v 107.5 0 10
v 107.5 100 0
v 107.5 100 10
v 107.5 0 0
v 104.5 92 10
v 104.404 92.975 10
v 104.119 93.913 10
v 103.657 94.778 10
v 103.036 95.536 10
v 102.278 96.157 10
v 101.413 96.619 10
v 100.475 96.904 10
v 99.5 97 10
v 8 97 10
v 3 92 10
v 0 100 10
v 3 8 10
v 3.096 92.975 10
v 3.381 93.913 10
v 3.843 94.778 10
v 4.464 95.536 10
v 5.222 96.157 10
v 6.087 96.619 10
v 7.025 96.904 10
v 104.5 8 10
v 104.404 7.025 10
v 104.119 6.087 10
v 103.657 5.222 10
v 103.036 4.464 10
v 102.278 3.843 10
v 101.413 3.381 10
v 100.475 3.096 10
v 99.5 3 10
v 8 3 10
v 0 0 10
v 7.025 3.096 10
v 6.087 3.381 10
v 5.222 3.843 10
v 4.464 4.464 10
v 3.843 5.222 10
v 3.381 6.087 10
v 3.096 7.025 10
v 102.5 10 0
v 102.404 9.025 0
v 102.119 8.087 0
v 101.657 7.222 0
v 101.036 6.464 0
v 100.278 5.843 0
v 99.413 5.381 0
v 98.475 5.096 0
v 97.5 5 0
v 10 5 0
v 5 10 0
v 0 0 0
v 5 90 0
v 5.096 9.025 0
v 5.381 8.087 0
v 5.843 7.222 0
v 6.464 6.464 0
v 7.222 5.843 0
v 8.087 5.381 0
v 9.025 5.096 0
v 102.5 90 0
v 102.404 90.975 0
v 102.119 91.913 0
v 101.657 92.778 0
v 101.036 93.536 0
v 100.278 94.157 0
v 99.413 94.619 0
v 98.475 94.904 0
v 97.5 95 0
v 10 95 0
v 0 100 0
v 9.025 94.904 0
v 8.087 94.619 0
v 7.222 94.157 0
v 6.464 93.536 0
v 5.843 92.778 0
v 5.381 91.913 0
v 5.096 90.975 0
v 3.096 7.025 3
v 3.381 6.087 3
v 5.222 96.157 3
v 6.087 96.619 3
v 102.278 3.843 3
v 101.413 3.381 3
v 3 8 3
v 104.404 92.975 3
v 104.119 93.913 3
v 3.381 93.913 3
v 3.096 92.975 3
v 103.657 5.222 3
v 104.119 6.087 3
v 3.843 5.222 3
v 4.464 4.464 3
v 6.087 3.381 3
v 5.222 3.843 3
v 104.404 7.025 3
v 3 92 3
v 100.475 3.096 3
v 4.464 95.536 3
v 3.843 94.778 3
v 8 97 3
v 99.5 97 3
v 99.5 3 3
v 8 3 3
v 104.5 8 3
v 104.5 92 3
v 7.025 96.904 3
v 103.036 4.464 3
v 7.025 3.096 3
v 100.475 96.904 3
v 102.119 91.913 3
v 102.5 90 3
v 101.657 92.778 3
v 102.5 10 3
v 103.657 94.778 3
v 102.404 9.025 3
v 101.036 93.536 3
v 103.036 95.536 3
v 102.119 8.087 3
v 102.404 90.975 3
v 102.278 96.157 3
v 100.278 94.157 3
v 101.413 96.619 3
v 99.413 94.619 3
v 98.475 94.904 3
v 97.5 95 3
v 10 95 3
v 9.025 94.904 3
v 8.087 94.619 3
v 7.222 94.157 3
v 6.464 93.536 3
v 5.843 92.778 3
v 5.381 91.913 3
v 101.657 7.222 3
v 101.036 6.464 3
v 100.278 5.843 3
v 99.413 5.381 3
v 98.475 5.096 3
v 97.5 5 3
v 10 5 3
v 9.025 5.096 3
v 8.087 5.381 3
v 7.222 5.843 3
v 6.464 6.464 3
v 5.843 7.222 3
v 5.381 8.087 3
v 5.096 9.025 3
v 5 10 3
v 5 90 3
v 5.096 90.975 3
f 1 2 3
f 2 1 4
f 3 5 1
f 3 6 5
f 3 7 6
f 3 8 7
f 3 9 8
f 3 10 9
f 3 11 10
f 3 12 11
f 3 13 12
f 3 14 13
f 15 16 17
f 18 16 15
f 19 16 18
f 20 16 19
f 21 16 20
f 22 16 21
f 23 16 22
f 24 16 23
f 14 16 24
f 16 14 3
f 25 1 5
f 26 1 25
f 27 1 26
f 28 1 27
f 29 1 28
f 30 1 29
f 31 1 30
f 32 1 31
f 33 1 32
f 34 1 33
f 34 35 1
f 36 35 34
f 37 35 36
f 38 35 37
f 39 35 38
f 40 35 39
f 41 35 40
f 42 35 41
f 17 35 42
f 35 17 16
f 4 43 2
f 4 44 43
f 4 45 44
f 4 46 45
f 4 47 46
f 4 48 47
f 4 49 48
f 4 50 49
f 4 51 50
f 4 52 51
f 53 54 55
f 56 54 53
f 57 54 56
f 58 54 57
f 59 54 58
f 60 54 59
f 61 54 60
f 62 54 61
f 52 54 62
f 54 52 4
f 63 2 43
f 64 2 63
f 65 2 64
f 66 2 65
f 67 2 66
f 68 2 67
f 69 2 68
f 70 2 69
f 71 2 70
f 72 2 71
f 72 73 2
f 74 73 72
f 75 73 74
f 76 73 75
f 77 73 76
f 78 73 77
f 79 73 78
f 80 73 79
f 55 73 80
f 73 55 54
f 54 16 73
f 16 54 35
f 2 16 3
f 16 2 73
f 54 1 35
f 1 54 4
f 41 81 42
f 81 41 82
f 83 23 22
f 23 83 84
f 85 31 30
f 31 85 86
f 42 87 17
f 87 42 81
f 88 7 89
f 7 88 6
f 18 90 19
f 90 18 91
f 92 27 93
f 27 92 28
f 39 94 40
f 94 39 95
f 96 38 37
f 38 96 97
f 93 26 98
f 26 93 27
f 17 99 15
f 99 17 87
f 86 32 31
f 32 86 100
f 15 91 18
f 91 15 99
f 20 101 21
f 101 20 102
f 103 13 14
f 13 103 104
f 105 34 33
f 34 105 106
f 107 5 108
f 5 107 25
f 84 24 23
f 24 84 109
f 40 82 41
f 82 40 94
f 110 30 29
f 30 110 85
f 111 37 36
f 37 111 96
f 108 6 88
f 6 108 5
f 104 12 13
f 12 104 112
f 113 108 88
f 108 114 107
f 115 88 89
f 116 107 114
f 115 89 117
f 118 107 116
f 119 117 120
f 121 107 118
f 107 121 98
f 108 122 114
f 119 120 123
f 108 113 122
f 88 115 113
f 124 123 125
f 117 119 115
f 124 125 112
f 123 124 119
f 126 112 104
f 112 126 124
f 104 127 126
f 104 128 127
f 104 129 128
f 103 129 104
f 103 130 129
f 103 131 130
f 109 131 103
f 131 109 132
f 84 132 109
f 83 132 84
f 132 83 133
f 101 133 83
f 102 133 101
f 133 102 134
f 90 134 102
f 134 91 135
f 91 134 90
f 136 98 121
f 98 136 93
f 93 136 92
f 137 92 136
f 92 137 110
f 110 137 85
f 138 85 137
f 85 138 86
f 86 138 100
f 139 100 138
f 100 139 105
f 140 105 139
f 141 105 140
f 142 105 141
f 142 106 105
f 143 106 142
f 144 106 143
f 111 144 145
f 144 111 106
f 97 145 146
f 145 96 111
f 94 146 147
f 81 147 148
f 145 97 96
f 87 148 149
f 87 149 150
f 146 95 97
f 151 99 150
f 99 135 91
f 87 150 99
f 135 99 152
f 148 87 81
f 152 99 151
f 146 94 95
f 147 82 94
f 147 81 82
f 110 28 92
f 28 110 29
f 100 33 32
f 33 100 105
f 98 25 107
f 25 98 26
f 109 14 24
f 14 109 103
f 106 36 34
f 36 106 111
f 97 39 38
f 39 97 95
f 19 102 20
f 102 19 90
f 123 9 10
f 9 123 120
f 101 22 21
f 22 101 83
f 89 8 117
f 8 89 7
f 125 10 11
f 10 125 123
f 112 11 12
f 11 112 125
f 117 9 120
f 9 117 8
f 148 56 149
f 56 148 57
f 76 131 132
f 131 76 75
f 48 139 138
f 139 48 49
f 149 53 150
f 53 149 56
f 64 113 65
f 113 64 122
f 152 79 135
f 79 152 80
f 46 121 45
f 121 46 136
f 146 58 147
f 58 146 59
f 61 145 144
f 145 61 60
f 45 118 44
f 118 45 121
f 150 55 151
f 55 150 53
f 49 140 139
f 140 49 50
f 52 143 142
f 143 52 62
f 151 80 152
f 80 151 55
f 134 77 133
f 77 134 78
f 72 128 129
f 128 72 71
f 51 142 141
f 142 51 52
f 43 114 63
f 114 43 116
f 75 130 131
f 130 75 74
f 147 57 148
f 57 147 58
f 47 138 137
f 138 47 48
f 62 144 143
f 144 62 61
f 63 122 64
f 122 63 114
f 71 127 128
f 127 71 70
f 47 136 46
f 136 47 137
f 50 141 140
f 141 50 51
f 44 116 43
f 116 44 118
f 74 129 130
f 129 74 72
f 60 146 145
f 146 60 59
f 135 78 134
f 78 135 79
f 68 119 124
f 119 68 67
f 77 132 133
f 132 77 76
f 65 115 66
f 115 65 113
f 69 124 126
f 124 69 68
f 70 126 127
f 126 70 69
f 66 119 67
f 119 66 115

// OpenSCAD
// file: ../../Various/SCAD/rounded_box.scad
/**
 * Small "library" for creating boxes with rounded edges.
 *
 * Hendrik Busch, 2017-20 (https://github.com/hmbusch)
 *
 */

/**
 * Creates either a circle with the given diameter or a square
 * where each side has the length of the diameter value. This module
 * exists to save code lines and should not be used externally.
 * 
 * @param circle
 *          if 'true', draw a circle, otherwise draw a square
 * @param diameter
 *          the measurement for the circle diameter or square side length
 */
module squareOrCircle(circle, diameter) {
    if (circle) {
        circle(d = diameter);
    } else {
        square([diameter, diameter], center = true);
    }
}

/**
 * Creates either a sphere with the given diameter or a half-sphere
 * where each side has the length of the diameter value. This module
 * exists to save code lines and should not be used externally.
 * 
 * @param sphere
 *          if 'true', draw a sphere, otherwise draw a cube
 * @param diameter
 *          the measurement for the sphere diameter or cube side length
 */
module cubeOrSphere(sphere, diameter, angle = 0) {
    if (sphere) {
        sphere(d = diameter);        
    } else {
        difference() {
            sphere(d = diameter);
            translate([diameter/4, 0, 0]) 
                cube([diameter/2, diameter, diameter], true);
        }
    }
}
 
/**
 * Creates a 2D-shape of a box with the given dimensions and rounded edges. 
 * Be sure to increase $fn for nicer edges.
 *
 * @param width
 *          the desired width of the box (default is 10mm)
 * @param depth
 *          the desired depth of the box (default is 10mm)
 * @param height
 *          the desired height of the box (default is 10mm)
 * @param edge_radius
 *          the radius of all the edges on the xy-plane (default is 2mm)
 * @param edges
 *          array of four boolean values to determine which of the four
 *          corners should be round (true) and which not (false). Order is
 *          bottom left, bottom right, top left, top right. Default value
 *          is true for all corners
 */  
module box_with_round_edges_2d(width = 10, depth = 10, edge_radius = 2, edges = [true, true, true, true]) {
    if (edge_radius <= 0) {
        square([width, depth]);
    } else {
        ed = edge_radius * 2;
        translate([edge_radius, edge_radius, 0]) hull() {
            squareOrCircle(edges[0], ed);
            translate([width - ed, 0, 0]) squareOrCircle(edges[1], ed);
            translate([0, depth - ed, 0]) squareOrCircle(edges[2], ed);
            translate([width - ed, depth - ed, 0]) squareOrCircle(edges[3], ed);    
        }
    }
}
 
/**
 * Call to create a box with rounded edges (edges will be round on one plane only).
 * Be sure to increase $fn for nicer edges.
 * 
 * @param width
 *          the desired width of the box (default is 10mm)
 * @param depth
 *          the desired depth of the box (default is 10mm)
 * @param height
 *          the desired height of the box (default is 10mm)
 * @param edge_radius
 *          the radius of all the edges on the xy-plane (default is 2mm)
 * @param edges
 *          array of four boolean values to determine which of the four
 *          corners should be round (true) and which not (false). Order is
 *          bottom left, bottom right, top left, top right. Default value
 *          is true for all corners
 *
 */
module box_with_round_edges_3d(width = 10, depth = 10, height = 10, edge_radius = 2, edges = [true, true, true, true]) {
	linear_extrude(height = height) {
		box_with_round_edges_2d(width, depth, edge_radius, edges);
	}
}

/**
 * Call to create a box with rounded edges (edges will be round on one plane only).
 * Be sure to increase $fn for nicer edges. This module has inputs that resemble
 * those of cube() so that it can act as a drop-in replacement.
 * 
 * @param dimensions
 *          3-value-array with x, y and z dimensions (default is 10x10x10mm).
 * @param edge_radius
 *          the radius of all the edges on the xy-plane (default is 2mm)
 * @param edges
 *          array of four boolean values to determine which of the four
 *          corners should be round (true) and which not (false). Order is
 *          bottom left, bottom right, top left, top right. Default value
 *          is true for all corners
 *
 */
module box_with_round_edges_3d(dimensions = [10, 10, 10], edge_radius = 2, edges = [true, true, true, true]) {
	linear_extrude(height = dimensions[2]) {
		box_with_round_edges_2d(dimensions[0], dimensions[1], edge_radius, edges);
	}
}

/**
 * Call to create a box with rounded edges (edges will be round on all planes).
 * Increased $fn gives you nicer looking edges but will also increase preview 
 * and compile time drastically (there are maaaany edges in these boxes).
 * This is still work in progress as it is rather tricky do get the box to look
 * correctly if single corners are not round. It involves working with either
 * spheres, half-spheres or cubes, depending on the look of connected corners. 
 *
 * @param dimensions
 *          3-value-array with x, y and z dimensions (default is 10x10x10mm).
 * @param edge_radius
 *          the radius of all the edges on the xy-plane (default is 2mm)
 * @param edges
 *          three-dimensional array to control each corner individually (2x2x2 elements).
 *          'true' gives you a round corner, 'false' a pointy one. Outer array is x, then y,
 *          then z.
 */
module cube_with_round_edges(dimensions = [10, 10, 10], edge_radius = 2, edges = [ [ [true, true], [true, true] ], [ [true, true], [true, true] ] ]) {
    dia = 2 * edge_radius;
    hull() {
        for(x = [0, 1]) {
            for (y = [0, 1]) {
                for (z = [0, 1]) {
                    trans_x = x == 0 ? edge_radius : dimensions[0] - edge_radius;
                    trans_y = y == 0 ? edge_radius : dimensions[0] - edge_radius;
                    trans_z = z == 0 ? edge_radius : dimensions[0] - edge_radius;
                    translate([trans_x, trans_y, trans_z])
                        cubeOrSphere(edges[x][y][z], dia);
                }
            }
        }
    }
}
// main file
use <../../Various/SCAD/rounded_box.scad>;

$fn = 32;

/*
 * Provides a guide for aligning 15mm boards with a 10cm spacing.
 * Drawing a line along this guide draws a perfect middle line.
 *
 *         <- 10cm ->Next board  
 *  |     |          |  |  |
 *  |     |==========+==|  |
 *  |     |==========+==|  | 
 *  |     |          |  |  |
 *  Board    Tool      Line
 * <-15mm-><-- 10.75cm ->  
 *
 */
difference() {
    cube([107.5, 100, 10]);
    translate([3, 3, 3])
        box_with_round_edges_3d([101.5, 94, 25], 5);
    translate([5, 5, 0])
        box_with_round_edges_3d([97.5, 90, 30], 5);    
}
